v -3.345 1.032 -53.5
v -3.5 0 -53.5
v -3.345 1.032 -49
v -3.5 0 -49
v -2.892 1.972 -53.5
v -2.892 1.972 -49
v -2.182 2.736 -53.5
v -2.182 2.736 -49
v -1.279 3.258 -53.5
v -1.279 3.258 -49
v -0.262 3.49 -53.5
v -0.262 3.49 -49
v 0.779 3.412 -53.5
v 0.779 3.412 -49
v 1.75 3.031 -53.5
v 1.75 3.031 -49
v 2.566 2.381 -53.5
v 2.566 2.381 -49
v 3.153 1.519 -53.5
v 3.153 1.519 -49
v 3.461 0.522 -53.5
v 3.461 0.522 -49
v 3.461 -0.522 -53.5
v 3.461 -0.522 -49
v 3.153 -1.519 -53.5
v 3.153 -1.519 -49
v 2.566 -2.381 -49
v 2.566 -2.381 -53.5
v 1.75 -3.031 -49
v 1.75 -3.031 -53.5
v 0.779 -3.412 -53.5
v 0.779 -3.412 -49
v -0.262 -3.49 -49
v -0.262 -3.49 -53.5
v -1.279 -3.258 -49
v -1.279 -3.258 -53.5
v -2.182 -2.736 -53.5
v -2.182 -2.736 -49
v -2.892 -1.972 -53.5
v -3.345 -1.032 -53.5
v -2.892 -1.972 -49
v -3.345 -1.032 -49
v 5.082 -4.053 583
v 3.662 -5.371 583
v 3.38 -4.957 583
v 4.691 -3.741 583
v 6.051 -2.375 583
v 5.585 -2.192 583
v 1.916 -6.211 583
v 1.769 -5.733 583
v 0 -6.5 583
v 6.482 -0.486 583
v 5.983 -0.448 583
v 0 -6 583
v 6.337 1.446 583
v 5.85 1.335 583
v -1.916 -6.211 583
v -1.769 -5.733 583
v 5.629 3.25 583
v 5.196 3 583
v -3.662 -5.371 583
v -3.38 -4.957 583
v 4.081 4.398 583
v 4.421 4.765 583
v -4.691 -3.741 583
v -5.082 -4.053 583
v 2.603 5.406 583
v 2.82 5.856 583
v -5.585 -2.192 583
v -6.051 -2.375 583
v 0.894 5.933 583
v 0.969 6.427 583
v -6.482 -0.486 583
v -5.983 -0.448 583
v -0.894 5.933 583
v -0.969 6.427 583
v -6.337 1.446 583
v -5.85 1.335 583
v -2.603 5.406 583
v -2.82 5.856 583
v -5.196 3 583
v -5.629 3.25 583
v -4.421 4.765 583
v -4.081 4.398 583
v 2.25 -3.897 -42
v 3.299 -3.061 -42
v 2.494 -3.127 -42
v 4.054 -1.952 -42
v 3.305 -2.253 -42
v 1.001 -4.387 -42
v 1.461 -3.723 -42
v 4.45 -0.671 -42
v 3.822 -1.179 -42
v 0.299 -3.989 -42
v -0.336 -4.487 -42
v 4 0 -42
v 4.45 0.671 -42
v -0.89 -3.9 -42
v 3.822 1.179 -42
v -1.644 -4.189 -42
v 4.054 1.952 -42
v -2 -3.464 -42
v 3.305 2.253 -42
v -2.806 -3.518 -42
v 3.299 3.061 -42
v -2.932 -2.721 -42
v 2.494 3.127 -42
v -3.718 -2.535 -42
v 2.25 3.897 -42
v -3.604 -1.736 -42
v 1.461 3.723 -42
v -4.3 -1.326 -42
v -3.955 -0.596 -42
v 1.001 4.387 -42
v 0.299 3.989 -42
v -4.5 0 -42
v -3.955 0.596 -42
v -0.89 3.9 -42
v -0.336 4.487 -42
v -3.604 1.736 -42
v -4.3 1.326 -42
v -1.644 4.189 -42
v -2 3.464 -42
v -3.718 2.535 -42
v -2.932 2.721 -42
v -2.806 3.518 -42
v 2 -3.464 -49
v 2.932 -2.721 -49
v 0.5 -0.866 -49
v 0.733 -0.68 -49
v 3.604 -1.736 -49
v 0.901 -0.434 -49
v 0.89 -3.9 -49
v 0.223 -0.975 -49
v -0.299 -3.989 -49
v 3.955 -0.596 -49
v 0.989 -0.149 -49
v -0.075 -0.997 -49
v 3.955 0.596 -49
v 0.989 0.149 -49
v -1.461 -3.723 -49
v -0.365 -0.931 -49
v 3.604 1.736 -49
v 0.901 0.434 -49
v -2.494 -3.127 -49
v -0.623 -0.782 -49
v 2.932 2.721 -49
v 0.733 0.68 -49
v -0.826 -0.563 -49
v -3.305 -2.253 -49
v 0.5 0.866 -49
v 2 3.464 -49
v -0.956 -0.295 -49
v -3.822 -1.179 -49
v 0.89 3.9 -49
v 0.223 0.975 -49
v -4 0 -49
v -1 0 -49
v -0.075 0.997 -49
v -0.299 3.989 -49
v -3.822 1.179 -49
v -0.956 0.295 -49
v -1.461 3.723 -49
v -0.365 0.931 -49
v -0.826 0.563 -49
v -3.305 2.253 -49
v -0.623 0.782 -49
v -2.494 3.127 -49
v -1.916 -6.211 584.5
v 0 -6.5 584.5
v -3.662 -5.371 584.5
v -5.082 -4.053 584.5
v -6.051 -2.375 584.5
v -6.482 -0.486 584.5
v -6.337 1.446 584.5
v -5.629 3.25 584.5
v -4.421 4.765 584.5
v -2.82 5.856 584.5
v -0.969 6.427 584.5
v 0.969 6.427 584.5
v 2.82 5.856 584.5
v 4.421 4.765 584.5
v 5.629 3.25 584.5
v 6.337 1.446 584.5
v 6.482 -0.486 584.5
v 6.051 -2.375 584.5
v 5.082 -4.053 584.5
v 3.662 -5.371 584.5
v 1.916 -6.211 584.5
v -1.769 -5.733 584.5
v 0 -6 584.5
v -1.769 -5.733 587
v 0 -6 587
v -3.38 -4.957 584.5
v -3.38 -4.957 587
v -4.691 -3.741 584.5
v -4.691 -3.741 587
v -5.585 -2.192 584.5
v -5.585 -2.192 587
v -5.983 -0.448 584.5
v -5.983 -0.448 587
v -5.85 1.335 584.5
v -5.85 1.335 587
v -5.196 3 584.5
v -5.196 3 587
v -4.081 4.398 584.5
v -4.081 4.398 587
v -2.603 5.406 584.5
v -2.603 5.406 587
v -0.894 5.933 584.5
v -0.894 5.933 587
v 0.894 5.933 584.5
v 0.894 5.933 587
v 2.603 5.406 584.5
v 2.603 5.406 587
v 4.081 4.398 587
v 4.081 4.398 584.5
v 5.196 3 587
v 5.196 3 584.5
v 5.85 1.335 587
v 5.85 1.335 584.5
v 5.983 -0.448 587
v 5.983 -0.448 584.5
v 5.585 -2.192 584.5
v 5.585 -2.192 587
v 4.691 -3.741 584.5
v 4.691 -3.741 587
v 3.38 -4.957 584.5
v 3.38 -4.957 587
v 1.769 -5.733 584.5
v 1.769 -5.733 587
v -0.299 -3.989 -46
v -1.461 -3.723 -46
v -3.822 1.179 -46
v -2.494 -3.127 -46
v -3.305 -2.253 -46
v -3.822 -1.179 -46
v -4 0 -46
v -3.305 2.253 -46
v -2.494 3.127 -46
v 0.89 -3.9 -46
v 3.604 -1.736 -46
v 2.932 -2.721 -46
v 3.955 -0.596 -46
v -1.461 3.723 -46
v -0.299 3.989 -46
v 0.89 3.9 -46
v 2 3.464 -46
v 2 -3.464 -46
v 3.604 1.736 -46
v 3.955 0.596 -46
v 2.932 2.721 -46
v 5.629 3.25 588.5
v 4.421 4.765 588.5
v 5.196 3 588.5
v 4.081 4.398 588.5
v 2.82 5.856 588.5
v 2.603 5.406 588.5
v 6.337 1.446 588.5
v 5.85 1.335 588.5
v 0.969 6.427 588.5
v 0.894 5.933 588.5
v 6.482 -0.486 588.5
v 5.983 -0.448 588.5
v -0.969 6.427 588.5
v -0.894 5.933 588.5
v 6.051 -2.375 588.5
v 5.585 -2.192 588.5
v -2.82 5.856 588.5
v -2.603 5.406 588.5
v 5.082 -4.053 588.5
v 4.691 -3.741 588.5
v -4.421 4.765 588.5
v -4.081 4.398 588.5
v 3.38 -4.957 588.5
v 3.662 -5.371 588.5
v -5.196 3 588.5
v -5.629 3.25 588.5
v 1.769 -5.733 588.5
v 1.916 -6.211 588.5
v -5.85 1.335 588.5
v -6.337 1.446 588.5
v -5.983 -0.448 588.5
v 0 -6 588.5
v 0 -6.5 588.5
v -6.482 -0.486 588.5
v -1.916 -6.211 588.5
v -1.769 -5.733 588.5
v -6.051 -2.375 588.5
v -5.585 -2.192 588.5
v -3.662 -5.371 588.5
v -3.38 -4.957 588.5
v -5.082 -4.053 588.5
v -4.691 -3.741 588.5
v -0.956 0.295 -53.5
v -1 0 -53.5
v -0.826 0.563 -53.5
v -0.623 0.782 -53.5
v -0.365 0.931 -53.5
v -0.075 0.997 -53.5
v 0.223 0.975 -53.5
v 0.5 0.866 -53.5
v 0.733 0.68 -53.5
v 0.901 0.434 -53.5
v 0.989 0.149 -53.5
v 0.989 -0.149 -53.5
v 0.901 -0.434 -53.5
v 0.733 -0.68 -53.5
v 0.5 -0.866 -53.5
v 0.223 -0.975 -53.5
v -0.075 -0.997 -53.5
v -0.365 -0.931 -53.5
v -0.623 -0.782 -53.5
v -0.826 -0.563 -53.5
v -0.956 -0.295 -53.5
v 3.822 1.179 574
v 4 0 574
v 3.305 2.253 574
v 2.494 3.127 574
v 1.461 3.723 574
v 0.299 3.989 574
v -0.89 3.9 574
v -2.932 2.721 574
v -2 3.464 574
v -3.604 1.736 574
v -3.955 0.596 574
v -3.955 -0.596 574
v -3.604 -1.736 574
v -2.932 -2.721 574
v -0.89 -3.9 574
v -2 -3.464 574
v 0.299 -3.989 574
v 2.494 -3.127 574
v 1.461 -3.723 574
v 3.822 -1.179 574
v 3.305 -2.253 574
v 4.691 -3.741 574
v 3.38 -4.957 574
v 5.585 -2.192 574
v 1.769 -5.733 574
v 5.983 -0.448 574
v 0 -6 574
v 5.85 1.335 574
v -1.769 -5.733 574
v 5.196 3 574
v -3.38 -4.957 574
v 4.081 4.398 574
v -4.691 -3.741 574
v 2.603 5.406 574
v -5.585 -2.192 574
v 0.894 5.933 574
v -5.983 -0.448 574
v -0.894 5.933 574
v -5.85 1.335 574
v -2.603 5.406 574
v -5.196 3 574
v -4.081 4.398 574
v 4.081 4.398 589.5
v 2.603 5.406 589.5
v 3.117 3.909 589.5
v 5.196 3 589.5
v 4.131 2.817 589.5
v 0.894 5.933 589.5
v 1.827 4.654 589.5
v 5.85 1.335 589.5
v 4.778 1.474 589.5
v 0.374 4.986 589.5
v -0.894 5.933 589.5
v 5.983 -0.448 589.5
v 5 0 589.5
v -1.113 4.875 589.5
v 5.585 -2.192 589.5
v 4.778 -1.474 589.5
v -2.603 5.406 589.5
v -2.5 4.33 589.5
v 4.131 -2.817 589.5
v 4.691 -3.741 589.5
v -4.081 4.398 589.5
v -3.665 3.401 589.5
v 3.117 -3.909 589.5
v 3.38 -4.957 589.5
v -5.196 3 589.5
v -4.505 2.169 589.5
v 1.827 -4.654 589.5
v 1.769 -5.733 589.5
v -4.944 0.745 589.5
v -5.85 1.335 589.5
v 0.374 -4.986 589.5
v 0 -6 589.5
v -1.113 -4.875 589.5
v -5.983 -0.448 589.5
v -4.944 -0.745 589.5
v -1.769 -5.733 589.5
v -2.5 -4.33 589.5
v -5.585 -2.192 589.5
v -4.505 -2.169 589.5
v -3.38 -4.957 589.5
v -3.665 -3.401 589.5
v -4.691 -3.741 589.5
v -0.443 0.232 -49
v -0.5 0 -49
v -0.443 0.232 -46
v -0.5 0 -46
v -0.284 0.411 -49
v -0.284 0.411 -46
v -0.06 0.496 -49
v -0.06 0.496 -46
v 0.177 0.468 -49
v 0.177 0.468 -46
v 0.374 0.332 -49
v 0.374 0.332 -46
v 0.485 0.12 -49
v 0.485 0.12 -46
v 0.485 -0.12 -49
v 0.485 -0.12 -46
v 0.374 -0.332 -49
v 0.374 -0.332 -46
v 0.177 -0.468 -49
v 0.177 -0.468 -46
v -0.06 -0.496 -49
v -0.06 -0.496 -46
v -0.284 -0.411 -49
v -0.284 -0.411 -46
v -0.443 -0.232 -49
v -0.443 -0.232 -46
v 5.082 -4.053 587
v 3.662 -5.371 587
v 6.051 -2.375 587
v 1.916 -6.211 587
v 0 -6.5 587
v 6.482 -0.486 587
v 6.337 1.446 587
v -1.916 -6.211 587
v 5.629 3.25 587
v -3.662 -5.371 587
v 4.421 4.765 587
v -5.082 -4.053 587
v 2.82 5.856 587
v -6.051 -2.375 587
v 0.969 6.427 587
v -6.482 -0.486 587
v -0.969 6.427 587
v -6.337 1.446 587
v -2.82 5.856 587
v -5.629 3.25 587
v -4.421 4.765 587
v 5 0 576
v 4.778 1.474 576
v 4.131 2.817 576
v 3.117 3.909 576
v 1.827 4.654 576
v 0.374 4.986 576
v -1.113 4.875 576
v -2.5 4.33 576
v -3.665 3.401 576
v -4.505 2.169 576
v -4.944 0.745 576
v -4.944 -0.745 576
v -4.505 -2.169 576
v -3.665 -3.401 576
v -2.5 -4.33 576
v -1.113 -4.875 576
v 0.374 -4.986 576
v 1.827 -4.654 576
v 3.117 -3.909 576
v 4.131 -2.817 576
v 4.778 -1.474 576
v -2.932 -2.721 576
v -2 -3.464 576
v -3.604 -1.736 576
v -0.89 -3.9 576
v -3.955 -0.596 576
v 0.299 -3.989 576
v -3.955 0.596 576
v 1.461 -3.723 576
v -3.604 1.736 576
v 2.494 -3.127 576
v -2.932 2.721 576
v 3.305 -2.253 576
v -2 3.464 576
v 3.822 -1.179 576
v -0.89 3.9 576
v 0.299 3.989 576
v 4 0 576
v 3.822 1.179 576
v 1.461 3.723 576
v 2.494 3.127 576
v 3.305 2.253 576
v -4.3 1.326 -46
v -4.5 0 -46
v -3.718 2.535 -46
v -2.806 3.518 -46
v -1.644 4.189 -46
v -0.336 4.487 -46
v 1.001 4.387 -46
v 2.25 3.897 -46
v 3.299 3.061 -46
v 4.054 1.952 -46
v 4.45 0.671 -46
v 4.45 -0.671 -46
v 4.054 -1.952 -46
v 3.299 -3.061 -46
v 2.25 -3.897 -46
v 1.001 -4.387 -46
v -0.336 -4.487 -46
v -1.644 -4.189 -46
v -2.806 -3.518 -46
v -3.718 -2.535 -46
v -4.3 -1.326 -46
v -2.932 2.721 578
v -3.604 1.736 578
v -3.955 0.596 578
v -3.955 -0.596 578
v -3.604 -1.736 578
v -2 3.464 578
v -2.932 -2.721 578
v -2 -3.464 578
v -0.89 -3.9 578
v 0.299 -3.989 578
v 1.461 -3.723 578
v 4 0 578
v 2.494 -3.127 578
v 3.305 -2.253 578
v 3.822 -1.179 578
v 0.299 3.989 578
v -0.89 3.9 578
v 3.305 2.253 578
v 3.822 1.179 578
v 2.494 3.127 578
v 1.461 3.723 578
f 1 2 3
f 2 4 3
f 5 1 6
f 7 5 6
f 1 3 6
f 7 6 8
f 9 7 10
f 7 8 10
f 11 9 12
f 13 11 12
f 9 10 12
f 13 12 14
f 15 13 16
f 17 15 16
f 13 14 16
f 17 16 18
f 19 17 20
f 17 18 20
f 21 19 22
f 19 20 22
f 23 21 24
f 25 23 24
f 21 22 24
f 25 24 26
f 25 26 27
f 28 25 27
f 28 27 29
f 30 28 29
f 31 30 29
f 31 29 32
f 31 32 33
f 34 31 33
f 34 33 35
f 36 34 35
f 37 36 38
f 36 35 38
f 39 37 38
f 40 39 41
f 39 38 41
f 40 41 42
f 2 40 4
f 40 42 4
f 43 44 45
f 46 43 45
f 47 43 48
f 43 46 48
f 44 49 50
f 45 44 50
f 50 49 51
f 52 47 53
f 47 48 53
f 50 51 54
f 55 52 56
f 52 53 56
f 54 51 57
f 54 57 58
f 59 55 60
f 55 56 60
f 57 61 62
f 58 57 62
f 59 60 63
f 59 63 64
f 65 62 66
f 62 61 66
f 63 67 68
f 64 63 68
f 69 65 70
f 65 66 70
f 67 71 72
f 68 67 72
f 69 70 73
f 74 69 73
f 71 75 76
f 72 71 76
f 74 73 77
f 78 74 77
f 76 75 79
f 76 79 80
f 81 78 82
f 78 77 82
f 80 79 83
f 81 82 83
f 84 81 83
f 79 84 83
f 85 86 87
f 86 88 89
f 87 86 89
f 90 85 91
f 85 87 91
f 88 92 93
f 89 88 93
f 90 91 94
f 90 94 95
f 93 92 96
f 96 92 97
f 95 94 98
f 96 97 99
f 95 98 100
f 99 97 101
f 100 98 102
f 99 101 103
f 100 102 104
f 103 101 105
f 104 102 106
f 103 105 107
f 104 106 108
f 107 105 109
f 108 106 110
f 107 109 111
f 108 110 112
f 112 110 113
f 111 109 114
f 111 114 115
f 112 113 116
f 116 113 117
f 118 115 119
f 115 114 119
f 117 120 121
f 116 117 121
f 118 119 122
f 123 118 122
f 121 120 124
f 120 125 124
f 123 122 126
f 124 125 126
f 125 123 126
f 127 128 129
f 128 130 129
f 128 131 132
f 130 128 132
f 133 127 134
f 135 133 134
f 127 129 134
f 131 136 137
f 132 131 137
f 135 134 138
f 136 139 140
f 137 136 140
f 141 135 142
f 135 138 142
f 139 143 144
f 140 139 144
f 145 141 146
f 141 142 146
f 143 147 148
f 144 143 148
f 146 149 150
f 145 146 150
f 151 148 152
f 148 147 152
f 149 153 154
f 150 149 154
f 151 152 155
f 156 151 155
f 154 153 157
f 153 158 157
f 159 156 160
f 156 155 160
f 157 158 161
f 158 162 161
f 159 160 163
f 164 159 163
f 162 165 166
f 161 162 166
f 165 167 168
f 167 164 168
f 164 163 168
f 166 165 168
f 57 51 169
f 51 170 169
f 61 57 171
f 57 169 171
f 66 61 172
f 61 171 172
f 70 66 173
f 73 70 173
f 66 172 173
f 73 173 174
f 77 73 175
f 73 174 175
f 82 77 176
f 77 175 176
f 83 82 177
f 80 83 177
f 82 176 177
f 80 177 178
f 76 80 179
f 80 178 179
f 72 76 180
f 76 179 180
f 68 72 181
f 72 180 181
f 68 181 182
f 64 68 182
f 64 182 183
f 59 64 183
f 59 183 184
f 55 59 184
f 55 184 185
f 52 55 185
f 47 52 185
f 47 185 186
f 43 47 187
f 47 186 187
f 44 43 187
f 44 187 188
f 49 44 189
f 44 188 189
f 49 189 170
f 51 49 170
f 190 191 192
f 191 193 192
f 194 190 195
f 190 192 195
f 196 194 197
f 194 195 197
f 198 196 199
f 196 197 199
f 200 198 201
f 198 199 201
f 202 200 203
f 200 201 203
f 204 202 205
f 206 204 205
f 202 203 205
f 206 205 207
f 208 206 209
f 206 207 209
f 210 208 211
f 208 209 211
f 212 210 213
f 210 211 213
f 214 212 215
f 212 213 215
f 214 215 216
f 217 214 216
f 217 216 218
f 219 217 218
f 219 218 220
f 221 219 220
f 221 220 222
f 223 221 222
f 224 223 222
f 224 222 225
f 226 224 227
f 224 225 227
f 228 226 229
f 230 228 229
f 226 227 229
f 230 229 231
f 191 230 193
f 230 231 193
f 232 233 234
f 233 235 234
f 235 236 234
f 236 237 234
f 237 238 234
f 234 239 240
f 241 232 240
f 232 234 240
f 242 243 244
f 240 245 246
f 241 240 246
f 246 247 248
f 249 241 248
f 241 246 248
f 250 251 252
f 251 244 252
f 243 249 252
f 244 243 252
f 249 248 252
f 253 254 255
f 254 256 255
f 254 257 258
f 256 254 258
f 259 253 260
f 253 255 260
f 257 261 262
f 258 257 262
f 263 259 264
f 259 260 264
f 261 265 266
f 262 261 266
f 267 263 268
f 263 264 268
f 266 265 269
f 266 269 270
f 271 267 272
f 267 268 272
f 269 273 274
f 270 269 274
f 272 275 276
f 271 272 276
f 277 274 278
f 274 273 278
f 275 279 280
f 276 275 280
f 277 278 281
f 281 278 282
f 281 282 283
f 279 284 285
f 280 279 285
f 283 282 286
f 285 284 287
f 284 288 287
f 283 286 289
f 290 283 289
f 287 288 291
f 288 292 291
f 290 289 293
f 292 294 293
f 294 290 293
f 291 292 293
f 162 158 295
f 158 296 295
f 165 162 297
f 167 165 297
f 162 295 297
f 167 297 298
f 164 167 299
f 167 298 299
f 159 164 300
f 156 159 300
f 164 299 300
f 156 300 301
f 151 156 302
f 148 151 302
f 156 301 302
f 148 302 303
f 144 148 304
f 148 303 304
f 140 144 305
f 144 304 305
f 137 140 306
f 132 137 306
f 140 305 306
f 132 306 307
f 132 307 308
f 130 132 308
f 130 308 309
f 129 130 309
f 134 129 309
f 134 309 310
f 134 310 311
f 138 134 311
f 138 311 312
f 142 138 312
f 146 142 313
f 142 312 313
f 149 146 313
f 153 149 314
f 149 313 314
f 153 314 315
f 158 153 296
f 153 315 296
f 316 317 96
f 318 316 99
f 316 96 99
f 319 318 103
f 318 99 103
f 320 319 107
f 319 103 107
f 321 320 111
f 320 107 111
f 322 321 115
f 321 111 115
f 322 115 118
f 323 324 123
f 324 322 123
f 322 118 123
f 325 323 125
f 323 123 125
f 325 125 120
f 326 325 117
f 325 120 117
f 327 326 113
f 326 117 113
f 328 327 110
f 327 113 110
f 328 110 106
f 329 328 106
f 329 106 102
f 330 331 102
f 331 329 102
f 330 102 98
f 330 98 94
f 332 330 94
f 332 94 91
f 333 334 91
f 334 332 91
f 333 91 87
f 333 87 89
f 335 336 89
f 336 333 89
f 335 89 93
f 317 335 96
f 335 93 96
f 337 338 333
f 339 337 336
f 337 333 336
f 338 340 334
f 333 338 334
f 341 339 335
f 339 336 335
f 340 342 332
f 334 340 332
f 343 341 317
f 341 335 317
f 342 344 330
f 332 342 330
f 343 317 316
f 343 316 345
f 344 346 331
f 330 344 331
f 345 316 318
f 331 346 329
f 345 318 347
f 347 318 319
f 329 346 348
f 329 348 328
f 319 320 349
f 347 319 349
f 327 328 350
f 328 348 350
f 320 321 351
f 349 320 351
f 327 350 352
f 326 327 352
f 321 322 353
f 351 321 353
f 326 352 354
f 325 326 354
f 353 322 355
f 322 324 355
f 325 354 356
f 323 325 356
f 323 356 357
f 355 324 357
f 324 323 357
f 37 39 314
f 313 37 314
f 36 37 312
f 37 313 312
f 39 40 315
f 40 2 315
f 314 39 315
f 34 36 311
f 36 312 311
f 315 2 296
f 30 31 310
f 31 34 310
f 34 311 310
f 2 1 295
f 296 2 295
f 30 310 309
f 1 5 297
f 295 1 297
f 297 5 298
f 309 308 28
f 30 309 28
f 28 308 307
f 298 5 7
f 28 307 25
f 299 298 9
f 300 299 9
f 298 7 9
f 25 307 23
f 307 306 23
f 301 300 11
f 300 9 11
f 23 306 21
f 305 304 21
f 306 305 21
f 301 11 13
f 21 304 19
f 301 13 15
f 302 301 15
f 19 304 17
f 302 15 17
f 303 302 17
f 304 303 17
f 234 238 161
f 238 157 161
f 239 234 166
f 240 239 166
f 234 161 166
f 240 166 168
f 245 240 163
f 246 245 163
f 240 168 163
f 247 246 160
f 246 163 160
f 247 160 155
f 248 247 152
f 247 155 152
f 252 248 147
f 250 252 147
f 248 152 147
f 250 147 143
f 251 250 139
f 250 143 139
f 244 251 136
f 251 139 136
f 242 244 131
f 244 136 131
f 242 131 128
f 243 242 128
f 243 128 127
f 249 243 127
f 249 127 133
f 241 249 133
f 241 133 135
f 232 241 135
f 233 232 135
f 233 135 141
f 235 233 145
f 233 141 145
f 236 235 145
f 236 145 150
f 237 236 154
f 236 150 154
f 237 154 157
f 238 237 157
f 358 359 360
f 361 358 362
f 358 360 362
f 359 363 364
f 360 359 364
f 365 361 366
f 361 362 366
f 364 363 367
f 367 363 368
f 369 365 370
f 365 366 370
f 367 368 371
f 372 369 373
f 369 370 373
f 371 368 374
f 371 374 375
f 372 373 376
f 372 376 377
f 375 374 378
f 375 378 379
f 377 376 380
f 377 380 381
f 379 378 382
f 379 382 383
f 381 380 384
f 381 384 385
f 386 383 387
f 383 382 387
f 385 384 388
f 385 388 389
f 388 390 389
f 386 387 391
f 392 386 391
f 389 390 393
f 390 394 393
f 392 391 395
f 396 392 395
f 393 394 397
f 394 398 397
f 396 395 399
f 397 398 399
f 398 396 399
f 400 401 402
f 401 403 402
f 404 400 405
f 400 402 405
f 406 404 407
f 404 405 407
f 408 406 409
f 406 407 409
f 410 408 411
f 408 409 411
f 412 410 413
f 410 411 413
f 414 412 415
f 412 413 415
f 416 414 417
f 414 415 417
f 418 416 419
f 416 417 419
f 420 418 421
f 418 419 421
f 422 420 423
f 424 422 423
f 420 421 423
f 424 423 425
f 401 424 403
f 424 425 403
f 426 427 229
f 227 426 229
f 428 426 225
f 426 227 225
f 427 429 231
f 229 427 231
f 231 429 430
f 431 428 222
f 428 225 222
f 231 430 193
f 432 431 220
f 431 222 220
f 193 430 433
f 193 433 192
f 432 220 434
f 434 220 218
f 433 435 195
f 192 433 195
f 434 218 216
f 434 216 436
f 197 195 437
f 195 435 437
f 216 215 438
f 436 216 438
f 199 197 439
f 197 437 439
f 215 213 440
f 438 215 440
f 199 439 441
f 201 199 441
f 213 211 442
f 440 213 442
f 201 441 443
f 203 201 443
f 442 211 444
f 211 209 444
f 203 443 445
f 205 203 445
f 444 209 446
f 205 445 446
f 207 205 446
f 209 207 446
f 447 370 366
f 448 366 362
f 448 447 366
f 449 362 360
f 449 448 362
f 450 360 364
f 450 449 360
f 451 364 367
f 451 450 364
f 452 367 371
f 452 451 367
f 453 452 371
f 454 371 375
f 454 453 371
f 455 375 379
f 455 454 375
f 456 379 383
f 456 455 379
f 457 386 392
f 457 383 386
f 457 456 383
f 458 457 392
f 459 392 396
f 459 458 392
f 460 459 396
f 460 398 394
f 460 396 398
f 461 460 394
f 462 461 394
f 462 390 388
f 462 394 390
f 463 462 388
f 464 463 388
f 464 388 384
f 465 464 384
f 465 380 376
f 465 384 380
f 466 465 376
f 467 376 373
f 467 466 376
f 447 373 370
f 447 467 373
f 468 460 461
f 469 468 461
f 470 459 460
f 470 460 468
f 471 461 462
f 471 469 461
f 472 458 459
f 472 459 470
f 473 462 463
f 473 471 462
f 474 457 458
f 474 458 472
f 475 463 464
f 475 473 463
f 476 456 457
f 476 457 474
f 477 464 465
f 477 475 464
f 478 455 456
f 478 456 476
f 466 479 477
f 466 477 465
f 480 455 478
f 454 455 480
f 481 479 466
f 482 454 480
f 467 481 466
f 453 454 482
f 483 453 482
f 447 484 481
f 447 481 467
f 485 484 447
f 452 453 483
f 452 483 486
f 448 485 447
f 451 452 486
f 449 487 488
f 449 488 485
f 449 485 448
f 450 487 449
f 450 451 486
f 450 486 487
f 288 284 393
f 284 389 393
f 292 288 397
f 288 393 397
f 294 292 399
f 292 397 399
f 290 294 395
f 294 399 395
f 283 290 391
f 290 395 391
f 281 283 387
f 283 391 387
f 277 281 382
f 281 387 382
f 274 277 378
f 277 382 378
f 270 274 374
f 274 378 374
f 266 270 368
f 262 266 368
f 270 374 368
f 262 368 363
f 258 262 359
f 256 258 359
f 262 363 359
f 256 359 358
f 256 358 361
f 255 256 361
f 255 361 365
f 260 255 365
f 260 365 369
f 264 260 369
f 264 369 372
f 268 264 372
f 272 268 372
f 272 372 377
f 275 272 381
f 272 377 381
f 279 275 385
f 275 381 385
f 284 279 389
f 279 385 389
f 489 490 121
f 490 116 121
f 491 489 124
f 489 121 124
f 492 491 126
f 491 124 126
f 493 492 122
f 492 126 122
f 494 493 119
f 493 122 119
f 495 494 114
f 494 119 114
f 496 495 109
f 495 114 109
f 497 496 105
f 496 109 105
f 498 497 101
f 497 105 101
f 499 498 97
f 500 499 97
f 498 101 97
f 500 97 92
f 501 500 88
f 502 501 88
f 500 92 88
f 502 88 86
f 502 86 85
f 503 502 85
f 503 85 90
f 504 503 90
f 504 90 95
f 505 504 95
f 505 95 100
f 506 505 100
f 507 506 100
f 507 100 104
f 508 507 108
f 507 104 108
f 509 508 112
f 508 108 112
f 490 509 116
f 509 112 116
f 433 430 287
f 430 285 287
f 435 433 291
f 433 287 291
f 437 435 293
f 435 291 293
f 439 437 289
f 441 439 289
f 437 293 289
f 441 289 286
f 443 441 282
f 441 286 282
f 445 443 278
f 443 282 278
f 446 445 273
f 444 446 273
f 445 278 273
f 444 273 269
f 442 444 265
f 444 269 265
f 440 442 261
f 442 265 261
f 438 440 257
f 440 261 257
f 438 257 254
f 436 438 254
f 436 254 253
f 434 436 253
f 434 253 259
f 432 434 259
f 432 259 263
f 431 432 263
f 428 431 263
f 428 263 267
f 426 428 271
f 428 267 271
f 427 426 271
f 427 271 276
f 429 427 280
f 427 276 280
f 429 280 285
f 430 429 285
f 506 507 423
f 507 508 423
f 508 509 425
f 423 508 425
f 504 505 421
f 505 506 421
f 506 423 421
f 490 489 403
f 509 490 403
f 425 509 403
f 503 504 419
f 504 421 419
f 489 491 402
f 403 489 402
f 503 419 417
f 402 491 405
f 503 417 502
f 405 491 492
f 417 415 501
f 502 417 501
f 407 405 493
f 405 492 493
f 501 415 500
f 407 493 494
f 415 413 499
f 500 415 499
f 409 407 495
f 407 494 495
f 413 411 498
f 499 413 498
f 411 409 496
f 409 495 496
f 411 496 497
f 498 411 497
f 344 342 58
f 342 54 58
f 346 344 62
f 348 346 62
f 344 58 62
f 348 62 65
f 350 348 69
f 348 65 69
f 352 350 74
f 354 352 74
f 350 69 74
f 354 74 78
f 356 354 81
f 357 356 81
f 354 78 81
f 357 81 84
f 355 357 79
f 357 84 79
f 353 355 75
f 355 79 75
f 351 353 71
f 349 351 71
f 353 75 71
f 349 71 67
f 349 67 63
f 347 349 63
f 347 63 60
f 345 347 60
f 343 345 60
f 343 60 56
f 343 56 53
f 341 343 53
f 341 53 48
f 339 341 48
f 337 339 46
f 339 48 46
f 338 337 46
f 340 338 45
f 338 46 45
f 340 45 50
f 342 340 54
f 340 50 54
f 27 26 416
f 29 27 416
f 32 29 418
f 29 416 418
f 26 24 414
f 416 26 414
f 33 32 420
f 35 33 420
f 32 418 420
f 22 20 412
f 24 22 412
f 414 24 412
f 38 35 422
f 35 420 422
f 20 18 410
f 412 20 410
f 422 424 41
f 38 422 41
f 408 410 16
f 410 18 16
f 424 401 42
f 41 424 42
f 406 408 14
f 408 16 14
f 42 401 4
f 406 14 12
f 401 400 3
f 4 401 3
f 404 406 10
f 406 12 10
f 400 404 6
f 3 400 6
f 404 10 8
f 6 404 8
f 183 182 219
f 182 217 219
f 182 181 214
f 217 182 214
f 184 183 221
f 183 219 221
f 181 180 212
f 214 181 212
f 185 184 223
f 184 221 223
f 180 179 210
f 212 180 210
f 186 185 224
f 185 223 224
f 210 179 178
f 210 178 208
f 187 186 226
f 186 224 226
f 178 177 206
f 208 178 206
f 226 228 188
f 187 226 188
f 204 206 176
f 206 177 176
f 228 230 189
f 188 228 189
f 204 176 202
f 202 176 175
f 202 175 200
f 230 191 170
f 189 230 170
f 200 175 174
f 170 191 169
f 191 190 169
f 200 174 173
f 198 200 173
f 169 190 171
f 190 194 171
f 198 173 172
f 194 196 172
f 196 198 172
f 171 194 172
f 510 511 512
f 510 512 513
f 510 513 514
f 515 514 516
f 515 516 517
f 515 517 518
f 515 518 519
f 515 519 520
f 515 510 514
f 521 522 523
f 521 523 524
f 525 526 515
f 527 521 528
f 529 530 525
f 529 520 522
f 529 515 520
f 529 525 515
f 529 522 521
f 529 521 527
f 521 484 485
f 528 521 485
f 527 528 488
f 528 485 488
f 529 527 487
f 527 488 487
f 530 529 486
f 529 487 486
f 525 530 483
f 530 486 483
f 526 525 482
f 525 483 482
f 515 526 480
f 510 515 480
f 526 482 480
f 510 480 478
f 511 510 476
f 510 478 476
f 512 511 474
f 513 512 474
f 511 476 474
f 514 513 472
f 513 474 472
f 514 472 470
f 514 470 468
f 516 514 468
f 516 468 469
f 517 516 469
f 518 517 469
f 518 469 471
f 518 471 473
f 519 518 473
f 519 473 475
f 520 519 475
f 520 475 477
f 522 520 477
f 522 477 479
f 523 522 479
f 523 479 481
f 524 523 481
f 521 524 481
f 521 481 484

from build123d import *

# Parameters (mm, degrees)
CYLINDER008_R              = 4
CYLINDER008_DEPTH          = 620
REVOLVE006_PLACEMENT_ANGLE = 180
CYLINDER009_R              = 5
CYLINDER009_DEPTH          = 30
REVOLVE007_PLACEMENT_ANGLE = 180


with BuildPart() as cylinder008:
    # Cylinder008 → Cylinder008 (new body)
    with BuildSketch(Plane.XY):
        Circle(CYLINDER008_R)
    extrude(amount=CYLINDER008_DEPTH)


with BuildPart() as revolve006:
    # Sketch006 → Revolve006 (revolve)
    with BuildSketch(Plane.XZ):
        Polygon((0, 0), (0, 4), (4, 4), (4, 7), (1, 7), (1, 11.5), (3.5, 11.5), (3.5, 7), (0.5, 7), (0.5, 4), (4.5, 4), (4.5, 0), align=None)
    revolve(axis=Axis((0, 0, 0), (0, 0, 1)))


with BuildPart() as revolve006_1:
    # Revolve006 placement: moved
    add(revolve006.part.rotate(Axis((0, 0, 0), (0, 1, 0)), REVOLVE006_PLACEMENT_ANGLE))


with BuildPart() as cylinder009:
    # Cylinder009 → Cylinder009 (new body)
    with BuildSketch(Plane.XY.offset(618)):
        Circle(CYLINDER009_R)
    extrude(amount=CYLINDER009_DEPTH)


with BuildPart() as straw003:
    # Sketch007 → Revolve007 (revolve)
    with BuildSketch(Plane.YZ):
        Polygon((0, 0), (0, 1), (-0.5, 1), (-0.5, 2.5), (0, 2.5), (0, 5), (-0.5, 5), (-0.5, 6.5), (0, 6.5), (0, 15.5), (6, 15.5), (6, 6.5), (6.5, 6.5), (6.5, 5), (6, 5), (6, 2.5), (6.5, 2.5), (6.5, 1), (6, 1), (6, 0), align=None)
    revolve(axis=Axis((0, 0, 0), (0, 0, 1)))


with BuildPart() as straw003_1:
    # Revolve007 placement: moved
    add(straw003.part.moved(Location((0, 0, 631.5))).rotate(Axis((0, 0, 631.5), (1, 0, 0)), REVOLVE007_PLACEMENT_ANGLE))

    # Cut006: cut Cylinder009
    add(cylinder009.part, mode=Mode.SUBTRACT)

    # Fusion003: union Cylinder008, Revolve006
    add(cylinder008.part)
    add(revolve006_1.part)


with BuildPart() as straw003_2:
    # Fusion003 placement: moved
    add(straw003_1.part.moved(Location((0, 0, -42))))


solid = straw003_2.part
